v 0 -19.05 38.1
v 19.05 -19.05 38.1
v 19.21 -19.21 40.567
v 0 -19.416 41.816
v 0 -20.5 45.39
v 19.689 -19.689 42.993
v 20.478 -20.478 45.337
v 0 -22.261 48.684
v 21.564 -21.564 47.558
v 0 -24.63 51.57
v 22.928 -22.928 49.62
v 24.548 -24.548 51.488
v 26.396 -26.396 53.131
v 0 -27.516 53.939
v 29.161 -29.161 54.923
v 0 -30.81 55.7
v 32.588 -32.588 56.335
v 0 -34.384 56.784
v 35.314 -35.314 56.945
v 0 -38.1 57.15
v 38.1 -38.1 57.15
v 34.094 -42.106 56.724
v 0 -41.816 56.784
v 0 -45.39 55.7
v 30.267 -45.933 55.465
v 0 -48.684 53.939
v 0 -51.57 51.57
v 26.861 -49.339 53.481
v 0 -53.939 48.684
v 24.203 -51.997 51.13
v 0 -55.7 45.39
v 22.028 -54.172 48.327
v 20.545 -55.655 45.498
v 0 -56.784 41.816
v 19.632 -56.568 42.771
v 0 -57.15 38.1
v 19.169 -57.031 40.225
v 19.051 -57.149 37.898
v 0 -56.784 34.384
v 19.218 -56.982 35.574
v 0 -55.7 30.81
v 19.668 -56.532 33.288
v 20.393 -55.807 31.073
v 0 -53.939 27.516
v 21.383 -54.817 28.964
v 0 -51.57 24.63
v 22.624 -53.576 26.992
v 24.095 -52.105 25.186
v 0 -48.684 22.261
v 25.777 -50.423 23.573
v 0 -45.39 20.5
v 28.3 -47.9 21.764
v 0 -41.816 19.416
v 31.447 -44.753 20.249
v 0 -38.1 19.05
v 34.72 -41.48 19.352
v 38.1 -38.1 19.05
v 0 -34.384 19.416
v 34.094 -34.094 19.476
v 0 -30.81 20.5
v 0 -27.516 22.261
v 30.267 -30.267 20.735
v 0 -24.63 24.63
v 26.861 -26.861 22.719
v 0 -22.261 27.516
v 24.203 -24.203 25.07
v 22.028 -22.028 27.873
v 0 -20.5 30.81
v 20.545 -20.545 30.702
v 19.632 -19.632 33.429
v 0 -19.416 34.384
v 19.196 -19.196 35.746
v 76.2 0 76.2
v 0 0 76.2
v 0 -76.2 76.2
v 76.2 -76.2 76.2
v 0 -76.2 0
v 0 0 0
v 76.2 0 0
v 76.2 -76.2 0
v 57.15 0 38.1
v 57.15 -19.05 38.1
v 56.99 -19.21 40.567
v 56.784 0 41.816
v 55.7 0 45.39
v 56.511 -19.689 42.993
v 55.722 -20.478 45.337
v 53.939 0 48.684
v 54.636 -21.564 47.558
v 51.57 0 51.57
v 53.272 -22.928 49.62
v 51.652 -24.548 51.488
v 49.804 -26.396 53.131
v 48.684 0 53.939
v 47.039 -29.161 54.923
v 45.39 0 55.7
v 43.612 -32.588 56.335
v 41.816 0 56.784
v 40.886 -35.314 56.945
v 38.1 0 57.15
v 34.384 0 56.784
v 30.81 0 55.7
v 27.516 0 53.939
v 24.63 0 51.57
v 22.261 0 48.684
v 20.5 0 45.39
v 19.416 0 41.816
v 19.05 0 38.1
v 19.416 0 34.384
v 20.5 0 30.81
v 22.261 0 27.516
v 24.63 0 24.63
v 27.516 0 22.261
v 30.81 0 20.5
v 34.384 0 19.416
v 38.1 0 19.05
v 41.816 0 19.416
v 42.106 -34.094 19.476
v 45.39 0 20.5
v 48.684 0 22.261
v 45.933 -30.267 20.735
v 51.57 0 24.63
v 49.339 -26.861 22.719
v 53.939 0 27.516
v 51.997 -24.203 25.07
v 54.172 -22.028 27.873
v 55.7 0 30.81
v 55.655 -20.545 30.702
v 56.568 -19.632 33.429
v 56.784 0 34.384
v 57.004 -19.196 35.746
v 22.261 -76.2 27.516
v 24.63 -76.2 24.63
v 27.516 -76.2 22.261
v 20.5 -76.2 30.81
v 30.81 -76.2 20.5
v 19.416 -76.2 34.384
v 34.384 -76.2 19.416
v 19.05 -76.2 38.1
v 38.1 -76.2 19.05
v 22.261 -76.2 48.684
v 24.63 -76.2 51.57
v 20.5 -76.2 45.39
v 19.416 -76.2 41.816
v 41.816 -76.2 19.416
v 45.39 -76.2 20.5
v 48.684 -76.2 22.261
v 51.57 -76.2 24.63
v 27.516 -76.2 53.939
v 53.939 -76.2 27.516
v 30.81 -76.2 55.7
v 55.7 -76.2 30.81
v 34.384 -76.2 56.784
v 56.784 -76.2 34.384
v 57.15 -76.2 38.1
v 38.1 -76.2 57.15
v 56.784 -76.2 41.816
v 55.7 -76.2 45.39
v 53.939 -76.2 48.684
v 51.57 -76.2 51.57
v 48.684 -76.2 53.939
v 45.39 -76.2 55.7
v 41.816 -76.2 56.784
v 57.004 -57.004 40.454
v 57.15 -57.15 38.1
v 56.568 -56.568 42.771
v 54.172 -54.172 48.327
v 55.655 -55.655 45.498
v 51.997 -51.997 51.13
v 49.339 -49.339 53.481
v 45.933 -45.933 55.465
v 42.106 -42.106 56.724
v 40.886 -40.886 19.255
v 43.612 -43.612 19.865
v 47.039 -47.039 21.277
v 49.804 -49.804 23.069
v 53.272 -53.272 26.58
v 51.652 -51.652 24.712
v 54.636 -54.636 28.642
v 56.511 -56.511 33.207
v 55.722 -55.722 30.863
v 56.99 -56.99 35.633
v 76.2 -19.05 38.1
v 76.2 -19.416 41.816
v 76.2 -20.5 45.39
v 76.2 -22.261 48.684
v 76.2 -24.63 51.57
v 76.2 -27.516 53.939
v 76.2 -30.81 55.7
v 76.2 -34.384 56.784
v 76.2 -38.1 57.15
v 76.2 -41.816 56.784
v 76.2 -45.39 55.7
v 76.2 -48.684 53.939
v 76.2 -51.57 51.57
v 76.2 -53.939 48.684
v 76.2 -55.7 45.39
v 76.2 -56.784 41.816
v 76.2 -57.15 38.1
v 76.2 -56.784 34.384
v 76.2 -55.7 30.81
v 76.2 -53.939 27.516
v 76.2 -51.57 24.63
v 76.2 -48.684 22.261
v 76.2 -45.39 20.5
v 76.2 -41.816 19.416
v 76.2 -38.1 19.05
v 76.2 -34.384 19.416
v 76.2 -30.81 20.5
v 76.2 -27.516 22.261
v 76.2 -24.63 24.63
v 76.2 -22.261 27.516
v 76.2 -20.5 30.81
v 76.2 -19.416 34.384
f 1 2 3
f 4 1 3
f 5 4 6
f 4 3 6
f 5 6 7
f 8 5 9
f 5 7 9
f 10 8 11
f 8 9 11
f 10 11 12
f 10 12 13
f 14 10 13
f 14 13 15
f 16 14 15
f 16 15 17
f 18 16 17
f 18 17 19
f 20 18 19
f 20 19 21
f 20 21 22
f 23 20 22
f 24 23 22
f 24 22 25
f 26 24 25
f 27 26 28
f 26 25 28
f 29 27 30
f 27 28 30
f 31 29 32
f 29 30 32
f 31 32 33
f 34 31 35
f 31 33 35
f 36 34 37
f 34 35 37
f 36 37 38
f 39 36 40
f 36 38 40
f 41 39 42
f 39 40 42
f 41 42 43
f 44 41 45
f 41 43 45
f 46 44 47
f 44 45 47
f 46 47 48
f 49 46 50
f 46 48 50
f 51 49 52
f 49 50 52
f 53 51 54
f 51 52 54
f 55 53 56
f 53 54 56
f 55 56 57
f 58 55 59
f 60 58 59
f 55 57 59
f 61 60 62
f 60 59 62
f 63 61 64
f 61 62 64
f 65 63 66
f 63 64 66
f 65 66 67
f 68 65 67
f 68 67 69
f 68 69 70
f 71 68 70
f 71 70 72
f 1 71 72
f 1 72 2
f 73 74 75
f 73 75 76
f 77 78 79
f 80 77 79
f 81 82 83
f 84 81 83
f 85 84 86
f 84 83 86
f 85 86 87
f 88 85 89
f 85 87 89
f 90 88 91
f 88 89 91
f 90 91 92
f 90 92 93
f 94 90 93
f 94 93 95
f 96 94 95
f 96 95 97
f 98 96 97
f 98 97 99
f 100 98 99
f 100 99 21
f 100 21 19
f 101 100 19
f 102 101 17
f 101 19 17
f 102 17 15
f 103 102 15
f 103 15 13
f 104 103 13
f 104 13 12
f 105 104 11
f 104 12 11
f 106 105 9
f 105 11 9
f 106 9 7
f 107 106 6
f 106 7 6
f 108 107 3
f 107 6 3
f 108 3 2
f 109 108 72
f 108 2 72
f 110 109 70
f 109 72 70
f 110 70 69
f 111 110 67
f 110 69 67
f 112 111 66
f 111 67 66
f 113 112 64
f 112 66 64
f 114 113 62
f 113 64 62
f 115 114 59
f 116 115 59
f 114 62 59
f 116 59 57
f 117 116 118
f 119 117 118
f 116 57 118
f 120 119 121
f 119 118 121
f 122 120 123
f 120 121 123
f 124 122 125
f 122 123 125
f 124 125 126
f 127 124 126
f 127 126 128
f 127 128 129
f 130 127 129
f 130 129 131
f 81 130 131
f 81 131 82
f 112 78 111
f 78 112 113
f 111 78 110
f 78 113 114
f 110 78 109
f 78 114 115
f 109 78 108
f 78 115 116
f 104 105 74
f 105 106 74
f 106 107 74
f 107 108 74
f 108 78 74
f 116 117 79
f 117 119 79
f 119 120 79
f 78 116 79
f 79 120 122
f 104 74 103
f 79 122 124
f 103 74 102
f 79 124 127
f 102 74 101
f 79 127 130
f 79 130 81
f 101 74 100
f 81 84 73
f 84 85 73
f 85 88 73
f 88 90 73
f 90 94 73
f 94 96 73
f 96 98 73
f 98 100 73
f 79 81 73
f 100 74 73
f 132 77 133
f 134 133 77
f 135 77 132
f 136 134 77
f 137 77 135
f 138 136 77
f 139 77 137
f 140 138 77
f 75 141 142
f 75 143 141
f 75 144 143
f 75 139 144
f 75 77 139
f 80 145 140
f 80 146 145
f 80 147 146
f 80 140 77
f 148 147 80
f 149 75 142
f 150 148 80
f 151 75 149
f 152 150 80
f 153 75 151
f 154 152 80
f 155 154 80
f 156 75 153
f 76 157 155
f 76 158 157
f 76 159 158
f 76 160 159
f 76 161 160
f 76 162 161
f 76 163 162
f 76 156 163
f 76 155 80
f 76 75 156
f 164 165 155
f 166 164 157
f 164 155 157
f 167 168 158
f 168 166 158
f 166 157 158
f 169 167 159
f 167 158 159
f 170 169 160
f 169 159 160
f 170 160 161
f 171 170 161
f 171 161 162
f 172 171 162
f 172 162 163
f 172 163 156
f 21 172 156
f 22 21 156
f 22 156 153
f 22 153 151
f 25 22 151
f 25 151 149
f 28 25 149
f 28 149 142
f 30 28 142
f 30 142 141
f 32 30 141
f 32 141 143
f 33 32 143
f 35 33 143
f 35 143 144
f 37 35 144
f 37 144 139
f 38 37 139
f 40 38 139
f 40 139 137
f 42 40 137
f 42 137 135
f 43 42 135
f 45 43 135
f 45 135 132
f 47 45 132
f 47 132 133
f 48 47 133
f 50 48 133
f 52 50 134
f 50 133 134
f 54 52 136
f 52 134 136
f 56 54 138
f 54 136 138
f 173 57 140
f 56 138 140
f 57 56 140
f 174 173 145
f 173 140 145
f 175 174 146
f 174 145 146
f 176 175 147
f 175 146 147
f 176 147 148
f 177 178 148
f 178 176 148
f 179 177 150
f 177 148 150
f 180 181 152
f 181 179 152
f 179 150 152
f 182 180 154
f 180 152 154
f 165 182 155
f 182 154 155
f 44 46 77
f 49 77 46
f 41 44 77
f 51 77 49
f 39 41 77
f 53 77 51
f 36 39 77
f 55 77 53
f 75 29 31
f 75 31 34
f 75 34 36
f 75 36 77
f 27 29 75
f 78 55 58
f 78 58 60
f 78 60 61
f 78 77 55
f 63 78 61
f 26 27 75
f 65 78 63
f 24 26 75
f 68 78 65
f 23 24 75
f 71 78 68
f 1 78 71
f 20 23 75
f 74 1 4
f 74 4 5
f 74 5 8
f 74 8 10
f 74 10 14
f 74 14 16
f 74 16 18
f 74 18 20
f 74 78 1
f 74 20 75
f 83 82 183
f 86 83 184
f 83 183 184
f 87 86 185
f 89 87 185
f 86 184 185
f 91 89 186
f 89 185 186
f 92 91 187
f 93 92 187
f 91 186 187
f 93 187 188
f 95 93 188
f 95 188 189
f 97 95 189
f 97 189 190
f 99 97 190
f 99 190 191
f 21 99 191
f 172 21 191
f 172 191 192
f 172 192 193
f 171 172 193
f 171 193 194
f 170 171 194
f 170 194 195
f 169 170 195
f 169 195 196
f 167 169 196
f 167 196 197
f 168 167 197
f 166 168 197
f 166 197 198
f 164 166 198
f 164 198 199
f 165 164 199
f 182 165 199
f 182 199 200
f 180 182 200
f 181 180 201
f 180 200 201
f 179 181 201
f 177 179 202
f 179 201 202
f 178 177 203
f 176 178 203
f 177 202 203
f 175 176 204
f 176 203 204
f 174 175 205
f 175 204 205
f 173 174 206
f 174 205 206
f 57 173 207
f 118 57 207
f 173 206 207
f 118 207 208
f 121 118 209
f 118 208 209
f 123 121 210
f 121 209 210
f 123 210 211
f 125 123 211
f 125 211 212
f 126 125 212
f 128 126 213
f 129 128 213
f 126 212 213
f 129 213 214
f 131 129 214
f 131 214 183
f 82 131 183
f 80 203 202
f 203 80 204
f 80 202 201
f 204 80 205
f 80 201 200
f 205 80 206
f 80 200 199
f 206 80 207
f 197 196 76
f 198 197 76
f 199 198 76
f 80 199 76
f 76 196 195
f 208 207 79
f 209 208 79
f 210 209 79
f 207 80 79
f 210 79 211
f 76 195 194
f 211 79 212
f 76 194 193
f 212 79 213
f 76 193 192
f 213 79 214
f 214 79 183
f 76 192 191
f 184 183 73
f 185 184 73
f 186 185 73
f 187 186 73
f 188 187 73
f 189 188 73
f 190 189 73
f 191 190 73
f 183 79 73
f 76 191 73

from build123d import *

# Parameters (mm, degrees)
F0_W     = 76.2
F0_H     = 76.2
F1_DEPTH = 76.2
F2_R     = 19.05
F3_DEPTH = 76.201
F4_R     = 19.05
F5_DEPTH = 76.2


with BuildPart() as f1:
    # F0 (on Front) → F1 (new body)
    with BuildSketch(Plane.XZ):
        with Locations((38.1, 38.1)):
            Rectangle(F0_W, F0_H)
    extrude(amount=F1_DEPTH)

    # F2 (on face) → F3 (cut, through all)
    with BuildSketch(Plane.YZ.offset(76.2)):
        with Locations((-38.1, 38.1)):
            Circle(F2_R)
    extrude(amount=-F3_DEPTH, mode=Mode.SUBTRACT)

    # F4 (on face) → F5 (cut)
    with BuildSketch(Plane.XZ.offset(76.2)):
        with Locations((38.1, 38.1)):
            Circle(F4_R)
    extrude(amount=-F5_DEPTH, mode=Mode.SUBTRACT)


solid = f1.part
